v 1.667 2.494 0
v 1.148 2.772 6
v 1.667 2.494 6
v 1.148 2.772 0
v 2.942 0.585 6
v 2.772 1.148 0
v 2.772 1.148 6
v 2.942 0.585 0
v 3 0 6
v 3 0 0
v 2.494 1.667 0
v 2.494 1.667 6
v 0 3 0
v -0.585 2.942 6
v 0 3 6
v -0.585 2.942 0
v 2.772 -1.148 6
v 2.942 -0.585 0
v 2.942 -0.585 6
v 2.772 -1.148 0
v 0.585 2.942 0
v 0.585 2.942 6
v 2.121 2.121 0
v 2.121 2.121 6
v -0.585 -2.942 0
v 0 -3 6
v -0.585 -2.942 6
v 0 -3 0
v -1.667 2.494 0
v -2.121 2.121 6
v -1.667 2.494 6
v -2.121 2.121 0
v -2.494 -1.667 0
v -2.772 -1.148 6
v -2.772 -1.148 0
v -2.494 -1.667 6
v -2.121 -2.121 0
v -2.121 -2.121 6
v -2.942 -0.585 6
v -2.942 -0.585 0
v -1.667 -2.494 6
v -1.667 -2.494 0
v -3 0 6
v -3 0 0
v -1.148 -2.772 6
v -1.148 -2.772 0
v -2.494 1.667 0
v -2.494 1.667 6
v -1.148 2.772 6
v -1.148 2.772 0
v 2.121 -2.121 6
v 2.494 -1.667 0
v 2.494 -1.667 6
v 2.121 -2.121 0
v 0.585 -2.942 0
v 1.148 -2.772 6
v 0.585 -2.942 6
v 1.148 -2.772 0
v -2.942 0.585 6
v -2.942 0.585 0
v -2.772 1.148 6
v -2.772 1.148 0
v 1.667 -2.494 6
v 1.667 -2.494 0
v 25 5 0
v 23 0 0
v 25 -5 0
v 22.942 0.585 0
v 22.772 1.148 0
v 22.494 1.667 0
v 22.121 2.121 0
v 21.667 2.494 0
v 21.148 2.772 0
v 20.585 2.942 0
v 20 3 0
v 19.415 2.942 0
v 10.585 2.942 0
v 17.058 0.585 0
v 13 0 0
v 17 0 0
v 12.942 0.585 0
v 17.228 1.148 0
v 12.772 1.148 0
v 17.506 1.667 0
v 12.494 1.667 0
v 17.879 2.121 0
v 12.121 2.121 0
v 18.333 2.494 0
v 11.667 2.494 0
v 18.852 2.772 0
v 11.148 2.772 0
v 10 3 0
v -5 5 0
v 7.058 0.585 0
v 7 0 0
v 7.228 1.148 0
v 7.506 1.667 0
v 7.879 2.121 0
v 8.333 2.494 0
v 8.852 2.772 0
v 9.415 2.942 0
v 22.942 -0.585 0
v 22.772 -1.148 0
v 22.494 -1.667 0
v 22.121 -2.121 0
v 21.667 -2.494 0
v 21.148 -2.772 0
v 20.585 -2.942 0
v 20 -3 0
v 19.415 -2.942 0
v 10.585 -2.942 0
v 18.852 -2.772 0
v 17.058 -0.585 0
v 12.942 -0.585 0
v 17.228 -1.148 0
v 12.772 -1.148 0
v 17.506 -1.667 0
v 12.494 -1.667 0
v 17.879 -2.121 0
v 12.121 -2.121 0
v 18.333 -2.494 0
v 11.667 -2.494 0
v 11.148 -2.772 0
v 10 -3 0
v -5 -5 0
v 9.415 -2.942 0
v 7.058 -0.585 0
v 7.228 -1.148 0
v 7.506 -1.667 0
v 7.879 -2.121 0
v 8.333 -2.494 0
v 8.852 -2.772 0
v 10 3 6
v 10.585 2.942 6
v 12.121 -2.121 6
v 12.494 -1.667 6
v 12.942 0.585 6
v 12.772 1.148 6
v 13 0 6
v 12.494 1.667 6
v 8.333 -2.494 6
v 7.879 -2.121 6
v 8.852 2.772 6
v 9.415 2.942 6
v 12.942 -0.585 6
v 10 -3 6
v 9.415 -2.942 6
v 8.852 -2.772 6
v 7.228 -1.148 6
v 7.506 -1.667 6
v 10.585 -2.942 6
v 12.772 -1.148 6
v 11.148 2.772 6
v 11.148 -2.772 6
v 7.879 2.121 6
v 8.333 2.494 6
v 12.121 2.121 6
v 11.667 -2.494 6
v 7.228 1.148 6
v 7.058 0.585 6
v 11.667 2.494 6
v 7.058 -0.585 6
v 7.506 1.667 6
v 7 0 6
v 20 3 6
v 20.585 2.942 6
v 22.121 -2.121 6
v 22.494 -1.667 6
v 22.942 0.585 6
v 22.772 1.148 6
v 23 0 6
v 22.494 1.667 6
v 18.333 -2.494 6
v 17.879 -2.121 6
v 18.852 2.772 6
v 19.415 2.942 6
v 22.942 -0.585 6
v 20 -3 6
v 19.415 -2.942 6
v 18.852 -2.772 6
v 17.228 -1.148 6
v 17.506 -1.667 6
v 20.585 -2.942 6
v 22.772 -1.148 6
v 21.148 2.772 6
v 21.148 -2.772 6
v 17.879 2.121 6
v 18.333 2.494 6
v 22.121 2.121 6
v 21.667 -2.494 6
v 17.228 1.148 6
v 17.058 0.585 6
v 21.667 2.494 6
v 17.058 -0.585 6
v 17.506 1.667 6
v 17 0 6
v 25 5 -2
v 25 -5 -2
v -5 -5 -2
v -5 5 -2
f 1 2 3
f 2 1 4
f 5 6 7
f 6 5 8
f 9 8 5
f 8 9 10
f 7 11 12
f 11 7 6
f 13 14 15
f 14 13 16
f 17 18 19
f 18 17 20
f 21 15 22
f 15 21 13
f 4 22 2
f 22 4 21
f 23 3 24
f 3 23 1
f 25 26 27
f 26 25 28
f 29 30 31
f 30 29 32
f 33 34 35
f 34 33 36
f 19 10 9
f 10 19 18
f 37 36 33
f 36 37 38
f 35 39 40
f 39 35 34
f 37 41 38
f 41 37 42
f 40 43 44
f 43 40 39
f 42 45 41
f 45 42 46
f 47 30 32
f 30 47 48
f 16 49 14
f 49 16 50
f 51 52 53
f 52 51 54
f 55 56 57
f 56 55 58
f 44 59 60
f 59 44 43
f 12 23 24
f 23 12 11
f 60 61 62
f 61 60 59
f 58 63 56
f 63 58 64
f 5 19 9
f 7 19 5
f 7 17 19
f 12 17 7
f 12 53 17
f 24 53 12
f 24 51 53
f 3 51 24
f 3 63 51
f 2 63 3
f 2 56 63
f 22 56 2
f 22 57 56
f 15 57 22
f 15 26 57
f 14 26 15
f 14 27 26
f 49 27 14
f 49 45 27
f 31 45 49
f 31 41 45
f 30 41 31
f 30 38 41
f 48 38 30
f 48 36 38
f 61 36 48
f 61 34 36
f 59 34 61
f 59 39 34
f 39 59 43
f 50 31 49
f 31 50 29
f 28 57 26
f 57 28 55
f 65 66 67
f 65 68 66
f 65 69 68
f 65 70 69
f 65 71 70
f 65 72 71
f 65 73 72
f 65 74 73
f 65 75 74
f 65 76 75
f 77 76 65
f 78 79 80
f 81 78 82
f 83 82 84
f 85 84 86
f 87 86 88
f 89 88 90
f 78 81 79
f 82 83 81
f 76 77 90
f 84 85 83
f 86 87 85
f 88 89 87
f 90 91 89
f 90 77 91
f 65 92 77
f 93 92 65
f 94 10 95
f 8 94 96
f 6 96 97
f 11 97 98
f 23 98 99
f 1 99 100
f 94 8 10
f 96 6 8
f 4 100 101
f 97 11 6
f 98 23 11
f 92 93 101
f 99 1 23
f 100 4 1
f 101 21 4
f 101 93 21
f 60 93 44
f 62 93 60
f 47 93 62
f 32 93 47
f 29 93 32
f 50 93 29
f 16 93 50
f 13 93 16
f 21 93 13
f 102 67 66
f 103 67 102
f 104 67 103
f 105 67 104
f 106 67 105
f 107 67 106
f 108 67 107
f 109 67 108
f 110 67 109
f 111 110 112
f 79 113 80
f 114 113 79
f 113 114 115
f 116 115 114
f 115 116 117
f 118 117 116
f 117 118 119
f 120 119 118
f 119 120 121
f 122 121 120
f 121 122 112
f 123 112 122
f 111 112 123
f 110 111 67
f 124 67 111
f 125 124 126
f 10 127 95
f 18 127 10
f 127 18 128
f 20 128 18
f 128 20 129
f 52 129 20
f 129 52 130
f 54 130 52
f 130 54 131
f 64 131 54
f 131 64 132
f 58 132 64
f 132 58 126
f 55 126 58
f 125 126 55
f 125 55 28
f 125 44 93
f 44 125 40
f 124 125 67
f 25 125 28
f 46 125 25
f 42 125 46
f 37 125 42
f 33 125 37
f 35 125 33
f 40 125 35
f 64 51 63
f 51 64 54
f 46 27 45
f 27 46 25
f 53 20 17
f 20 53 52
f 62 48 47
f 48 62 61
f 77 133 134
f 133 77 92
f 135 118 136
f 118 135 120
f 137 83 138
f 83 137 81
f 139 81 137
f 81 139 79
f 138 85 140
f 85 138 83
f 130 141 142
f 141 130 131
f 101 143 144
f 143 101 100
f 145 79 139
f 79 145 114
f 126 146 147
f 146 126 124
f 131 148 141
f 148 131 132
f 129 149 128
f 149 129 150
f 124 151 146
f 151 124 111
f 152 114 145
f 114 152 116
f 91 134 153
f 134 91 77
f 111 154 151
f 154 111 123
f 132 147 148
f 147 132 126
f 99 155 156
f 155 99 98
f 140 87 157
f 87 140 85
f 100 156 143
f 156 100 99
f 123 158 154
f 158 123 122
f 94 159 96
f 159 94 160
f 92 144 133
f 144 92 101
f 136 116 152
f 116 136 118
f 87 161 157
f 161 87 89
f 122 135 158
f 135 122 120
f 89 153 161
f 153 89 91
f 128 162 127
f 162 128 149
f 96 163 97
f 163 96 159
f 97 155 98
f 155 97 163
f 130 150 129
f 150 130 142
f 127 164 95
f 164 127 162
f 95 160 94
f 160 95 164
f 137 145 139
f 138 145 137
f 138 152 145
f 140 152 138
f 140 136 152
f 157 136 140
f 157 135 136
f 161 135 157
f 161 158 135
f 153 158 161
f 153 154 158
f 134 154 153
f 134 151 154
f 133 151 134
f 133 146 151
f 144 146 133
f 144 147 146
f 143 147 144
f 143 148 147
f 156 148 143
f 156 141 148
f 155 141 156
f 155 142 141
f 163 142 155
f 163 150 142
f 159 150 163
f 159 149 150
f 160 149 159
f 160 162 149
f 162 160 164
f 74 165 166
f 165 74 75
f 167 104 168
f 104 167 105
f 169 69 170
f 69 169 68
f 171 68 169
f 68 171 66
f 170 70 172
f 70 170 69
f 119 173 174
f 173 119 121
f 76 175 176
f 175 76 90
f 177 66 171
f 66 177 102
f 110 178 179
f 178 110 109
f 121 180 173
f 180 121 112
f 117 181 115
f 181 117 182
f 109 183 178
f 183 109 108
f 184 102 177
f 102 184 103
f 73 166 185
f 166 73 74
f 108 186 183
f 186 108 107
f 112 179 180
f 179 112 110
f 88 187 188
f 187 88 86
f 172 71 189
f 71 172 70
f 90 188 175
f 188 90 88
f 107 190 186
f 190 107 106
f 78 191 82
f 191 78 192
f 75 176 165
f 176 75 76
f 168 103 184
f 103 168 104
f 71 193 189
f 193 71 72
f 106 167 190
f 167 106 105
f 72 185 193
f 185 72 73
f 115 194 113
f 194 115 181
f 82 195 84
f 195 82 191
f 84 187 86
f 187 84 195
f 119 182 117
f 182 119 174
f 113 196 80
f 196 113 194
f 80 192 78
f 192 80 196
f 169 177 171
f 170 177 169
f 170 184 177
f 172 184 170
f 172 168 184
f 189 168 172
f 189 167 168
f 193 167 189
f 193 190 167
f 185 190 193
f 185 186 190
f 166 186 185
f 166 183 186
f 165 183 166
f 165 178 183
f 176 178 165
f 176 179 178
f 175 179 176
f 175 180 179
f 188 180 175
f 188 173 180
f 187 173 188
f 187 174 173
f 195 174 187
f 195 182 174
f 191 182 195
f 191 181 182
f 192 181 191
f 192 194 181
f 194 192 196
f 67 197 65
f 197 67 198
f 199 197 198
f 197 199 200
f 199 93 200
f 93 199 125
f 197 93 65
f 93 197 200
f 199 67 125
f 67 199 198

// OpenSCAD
// Original CanvasNet test fixture: a parametric peg board whose size is set by variables that a caller can
// override. A row of `pegs` round pegs, `pitch` apart, stands on a base strip that is as long as the row.
pegs = 3;
pitch = 10;
peg_radius = 3;
peg_height = 6;
base_thickness = 2;
$fn = 32;

module peg(i) {
  translate([i * pitch, 0, 0]) cylinder(r = peg_radius, h = peg_height);
}

// The base spans x -5 .. pegs * pitch - 5 and y -5 .. 5, below z = 0
color("steelblue")
  translate([-pitch / 2, -5, -base_thickness]) cube([pegs * pitch, 10, base_thickness]);

color("orange")
  for (i = [0 : pegs - 1]) peg(i);
